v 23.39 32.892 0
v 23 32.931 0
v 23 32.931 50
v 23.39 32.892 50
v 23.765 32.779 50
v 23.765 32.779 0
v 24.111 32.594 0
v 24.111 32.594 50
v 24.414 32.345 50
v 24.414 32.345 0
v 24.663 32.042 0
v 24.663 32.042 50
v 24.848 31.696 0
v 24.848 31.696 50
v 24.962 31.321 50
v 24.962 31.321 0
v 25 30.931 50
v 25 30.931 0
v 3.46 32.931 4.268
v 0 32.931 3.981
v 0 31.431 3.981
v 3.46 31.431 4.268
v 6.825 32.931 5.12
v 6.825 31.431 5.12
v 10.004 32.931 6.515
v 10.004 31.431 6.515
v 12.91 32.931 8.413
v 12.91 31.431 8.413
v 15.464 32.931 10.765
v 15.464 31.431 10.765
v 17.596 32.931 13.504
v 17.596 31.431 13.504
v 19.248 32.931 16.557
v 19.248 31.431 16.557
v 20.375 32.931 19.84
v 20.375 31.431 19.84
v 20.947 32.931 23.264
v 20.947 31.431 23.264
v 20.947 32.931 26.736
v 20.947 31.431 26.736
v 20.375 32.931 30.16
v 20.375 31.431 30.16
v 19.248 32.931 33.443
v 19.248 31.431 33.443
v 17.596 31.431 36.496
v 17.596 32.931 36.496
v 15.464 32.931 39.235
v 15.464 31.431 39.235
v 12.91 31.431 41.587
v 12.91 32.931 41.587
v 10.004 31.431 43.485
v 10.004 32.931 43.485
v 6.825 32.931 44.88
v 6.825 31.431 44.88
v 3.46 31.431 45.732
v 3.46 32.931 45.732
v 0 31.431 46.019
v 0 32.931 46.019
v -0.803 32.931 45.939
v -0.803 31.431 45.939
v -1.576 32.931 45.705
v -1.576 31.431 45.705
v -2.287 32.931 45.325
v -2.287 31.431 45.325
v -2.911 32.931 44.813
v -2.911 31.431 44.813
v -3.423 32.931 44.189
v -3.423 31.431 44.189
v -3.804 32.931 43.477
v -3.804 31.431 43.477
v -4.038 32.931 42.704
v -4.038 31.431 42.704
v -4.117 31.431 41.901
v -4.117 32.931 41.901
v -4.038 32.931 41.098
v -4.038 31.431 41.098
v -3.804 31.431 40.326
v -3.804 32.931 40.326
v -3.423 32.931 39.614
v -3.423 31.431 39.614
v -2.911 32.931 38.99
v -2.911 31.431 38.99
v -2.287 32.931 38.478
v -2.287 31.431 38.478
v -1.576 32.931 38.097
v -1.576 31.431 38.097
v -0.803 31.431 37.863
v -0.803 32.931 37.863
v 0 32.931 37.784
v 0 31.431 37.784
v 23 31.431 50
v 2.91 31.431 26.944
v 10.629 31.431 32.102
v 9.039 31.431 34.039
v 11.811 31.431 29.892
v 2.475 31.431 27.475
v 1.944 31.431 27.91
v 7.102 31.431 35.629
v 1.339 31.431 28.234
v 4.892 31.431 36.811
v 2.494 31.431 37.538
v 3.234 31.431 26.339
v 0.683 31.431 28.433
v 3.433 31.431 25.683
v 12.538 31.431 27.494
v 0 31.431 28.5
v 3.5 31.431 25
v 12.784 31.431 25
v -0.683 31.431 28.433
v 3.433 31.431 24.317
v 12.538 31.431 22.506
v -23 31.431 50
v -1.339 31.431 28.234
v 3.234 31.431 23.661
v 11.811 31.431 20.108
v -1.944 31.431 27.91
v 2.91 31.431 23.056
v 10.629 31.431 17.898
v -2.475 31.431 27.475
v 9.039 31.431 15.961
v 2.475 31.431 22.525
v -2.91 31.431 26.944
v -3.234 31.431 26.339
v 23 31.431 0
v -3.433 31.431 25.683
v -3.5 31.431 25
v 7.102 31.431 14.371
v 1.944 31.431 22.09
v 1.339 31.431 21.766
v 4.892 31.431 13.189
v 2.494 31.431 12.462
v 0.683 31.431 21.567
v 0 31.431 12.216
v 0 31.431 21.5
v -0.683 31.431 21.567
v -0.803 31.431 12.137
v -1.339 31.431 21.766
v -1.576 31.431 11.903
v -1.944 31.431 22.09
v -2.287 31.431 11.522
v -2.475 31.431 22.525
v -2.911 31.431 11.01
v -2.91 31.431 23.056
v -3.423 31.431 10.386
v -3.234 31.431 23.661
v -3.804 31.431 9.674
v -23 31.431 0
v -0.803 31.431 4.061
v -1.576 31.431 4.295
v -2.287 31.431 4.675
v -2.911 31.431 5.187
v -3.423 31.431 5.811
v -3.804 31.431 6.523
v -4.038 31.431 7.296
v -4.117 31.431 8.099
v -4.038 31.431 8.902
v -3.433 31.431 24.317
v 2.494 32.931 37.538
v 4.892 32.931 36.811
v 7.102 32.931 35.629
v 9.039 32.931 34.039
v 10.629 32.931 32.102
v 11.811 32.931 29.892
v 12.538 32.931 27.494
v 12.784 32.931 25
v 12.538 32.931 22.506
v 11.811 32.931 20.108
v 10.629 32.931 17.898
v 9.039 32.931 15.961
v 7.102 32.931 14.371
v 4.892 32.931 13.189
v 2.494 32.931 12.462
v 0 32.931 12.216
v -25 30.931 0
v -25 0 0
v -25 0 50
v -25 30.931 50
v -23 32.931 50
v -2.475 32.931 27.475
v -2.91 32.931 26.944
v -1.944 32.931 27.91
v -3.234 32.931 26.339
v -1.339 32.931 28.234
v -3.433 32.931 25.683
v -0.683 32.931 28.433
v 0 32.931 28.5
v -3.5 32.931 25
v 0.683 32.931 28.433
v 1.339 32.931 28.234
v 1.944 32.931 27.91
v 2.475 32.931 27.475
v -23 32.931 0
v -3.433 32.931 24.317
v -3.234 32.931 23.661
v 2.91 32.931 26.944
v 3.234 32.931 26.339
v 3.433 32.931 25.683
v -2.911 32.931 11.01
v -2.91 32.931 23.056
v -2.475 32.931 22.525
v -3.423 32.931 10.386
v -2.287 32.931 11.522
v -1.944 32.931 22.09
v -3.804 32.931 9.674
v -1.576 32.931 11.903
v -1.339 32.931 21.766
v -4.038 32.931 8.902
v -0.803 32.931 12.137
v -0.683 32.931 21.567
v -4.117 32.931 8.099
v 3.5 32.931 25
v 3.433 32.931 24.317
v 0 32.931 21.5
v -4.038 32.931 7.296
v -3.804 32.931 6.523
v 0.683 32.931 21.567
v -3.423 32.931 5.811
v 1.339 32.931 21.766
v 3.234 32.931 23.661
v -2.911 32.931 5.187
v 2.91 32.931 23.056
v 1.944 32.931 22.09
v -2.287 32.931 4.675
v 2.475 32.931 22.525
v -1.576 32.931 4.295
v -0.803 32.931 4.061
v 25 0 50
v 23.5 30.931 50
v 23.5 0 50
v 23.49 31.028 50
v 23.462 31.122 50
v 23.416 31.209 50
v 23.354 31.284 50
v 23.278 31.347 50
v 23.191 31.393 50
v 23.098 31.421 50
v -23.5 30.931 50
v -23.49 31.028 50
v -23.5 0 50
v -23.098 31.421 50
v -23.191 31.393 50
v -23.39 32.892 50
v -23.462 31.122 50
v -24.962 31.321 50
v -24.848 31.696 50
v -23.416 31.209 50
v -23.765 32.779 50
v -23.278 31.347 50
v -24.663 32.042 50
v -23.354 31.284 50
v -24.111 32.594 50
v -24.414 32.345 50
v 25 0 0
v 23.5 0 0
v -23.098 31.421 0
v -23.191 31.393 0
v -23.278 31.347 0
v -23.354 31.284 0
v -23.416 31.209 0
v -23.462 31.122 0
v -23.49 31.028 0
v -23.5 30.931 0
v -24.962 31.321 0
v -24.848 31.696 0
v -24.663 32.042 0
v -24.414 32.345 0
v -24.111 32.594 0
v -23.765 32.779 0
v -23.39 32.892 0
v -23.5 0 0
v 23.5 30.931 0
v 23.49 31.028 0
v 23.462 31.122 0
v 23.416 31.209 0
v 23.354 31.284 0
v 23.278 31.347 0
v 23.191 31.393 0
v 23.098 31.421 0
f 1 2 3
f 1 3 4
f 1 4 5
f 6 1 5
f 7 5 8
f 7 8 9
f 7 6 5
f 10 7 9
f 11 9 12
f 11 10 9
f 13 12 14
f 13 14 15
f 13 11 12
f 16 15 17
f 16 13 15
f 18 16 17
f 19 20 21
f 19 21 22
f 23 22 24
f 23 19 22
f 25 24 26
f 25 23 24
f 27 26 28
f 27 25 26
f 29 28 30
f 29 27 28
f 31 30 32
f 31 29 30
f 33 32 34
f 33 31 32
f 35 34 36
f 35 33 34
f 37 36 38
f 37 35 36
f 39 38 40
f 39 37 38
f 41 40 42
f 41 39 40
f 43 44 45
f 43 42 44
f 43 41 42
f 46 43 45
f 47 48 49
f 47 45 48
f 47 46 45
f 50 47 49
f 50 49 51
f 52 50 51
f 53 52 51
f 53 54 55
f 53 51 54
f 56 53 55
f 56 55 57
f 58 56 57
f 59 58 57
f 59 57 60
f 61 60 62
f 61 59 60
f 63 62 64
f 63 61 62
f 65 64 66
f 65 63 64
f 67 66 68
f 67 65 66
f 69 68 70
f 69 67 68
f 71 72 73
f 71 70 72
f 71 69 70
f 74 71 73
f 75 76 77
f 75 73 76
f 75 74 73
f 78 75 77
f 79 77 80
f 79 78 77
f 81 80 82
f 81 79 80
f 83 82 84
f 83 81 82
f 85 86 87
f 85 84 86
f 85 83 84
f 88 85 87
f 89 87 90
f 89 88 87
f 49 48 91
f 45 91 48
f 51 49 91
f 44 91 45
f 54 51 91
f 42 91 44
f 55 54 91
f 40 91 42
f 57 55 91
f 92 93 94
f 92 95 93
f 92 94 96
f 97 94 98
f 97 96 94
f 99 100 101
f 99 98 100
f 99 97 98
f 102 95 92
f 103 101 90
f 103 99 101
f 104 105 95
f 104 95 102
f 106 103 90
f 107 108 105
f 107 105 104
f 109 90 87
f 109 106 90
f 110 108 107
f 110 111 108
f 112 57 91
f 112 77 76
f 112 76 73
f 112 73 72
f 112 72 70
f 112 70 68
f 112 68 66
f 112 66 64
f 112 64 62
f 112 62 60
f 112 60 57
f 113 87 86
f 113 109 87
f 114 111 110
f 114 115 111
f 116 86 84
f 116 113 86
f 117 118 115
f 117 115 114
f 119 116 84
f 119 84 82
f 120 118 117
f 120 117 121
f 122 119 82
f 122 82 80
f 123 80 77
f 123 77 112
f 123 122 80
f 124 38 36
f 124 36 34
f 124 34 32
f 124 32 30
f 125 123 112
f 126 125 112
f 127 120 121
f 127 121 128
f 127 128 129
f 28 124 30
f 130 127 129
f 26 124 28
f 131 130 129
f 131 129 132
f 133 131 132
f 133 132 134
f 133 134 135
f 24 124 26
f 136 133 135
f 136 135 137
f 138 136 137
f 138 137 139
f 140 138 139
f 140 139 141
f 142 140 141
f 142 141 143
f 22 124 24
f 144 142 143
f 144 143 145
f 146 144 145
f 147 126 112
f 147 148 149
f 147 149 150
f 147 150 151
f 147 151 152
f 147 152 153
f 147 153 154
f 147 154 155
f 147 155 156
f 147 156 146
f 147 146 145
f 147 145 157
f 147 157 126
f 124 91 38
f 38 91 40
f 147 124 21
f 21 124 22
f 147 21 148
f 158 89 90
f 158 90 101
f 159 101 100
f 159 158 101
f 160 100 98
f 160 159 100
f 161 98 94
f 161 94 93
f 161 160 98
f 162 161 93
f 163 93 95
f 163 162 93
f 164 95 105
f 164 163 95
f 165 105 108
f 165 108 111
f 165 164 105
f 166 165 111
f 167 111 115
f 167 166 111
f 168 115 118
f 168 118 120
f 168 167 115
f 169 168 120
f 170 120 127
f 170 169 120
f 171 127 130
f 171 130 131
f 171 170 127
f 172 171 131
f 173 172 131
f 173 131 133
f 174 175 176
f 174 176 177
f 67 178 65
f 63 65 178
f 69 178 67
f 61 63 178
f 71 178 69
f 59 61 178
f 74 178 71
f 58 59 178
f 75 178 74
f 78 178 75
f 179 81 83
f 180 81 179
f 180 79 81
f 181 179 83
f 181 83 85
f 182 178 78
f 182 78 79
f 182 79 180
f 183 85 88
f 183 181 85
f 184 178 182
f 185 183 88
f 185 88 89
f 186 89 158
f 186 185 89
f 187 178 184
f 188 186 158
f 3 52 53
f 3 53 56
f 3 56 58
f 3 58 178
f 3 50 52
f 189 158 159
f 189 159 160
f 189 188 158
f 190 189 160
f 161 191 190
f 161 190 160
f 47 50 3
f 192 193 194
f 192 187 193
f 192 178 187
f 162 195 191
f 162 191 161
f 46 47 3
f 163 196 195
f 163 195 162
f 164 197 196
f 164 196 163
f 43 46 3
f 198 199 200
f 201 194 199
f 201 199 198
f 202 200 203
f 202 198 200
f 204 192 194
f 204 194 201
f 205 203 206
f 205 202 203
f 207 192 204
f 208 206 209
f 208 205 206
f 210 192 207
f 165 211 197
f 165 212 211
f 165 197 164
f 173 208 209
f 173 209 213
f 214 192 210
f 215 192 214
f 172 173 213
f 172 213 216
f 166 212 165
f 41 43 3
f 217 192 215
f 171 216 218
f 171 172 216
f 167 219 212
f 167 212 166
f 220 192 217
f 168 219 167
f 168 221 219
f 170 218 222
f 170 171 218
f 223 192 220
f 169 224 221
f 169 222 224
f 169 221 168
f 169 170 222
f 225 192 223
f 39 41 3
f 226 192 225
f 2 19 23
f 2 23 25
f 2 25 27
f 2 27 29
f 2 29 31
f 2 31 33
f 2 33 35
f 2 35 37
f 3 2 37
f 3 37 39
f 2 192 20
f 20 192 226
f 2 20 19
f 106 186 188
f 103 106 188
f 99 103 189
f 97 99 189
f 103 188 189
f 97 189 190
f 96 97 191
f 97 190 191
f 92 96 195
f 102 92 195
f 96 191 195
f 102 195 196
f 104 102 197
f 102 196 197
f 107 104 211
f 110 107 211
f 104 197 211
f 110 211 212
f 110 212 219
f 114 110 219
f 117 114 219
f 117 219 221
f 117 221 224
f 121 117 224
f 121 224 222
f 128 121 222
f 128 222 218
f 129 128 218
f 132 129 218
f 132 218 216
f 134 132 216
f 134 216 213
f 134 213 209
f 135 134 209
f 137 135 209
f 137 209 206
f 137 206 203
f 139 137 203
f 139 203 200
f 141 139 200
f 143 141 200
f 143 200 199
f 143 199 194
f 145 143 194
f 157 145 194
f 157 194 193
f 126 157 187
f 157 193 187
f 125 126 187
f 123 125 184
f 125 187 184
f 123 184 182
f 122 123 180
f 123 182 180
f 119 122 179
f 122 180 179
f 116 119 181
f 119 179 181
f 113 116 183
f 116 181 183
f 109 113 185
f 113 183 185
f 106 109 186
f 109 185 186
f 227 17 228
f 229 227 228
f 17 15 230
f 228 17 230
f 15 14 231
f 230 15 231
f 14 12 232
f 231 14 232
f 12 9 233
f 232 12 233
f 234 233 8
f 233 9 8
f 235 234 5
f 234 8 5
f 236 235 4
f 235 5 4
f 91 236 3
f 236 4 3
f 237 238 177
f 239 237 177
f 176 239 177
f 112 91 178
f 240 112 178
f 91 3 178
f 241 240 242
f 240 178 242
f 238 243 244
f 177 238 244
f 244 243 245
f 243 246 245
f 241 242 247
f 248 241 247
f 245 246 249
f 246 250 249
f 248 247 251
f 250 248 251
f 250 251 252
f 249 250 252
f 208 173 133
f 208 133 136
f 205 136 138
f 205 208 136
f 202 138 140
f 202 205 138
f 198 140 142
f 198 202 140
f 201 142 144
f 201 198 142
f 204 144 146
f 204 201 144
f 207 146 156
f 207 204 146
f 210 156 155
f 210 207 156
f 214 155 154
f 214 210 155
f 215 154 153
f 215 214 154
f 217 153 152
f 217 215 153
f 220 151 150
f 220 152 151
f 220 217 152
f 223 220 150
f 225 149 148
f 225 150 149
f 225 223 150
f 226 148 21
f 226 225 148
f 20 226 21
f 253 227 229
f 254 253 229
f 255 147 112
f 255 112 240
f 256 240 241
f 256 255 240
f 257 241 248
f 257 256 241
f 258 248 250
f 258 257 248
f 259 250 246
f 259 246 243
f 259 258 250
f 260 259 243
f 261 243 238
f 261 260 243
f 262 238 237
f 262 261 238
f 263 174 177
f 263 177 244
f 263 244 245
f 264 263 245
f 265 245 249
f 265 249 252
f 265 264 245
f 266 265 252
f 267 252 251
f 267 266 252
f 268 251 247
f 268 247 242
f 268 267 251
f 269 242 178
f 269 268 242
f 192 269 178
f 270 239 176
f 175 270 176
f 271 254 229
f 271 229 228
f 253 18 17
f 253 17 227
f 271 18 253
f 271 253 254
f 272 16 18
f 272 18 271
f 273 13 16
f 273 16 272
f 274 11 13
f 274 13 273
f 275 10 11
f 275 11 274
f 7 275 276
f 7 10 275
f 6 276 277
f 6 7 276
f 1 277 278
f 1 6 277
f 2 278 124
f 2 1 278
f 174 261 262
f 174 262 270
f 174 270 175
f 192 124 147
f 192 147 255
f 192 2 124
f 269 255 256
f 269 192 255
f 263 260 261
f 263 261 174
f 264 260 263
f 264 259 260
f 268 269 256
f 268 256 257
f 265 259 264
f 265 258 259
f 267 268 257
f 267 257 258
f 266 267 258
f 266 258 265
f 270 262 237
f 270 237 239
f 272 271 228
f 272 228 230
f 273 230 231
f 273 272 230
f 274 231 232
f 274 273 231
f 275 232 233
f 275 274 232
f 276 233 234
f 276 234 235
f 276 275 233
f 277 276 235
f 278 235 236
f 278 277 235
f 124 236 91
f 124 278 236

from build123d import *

# Parameters (mm, degrees)
BASE_FLANGE1_DEPTH = 50
SKETCH2_R          = 3.5
CUT_EXTRUDE1_DEPTH = 10
CUT_EXTRUDE2_DEPTH = 3


# Sheet-metal steps are written as plain solids
with BuildPart() as part:
    # Sketch1 → Base-Flange1 (new body)
    with BuildSketch(Plane.XY):
        with BuildLine():
            Line((-25, 0), (-25, 30.930870366))
            ThreePointArc((-25, 30.930870366), (-24.414213562, 32.345083928), (-23, 32.930870366))
            Line((-23, 32.930870366), (23, 32.930870366))
            ThreePointArc((23, 32.930870366), (24.414213562, 32.345083928), (25, 30.930870366))
            Line((25, 30.930870366), (25, 0))
            Line((25, 0), (23.5, 0))
            Line((23.5, 0), (23.5, 30.930870366))
            ThreePointArc((23.5, 30.930870366), (23.353553391, 31.284423757), (23, 31.430870366))
            Line((23, 31.430870366), (-23, 31.430870366))
            ThreePointArc((-23, 31.430870366), (-23.353553391, 31.284423757), (-23.5, 30.930870366))
            Line((-23.5, 30.930870366), (-23.5, 0))
            Line((-23.5, 0), (-25, 0))
        make_face()
    extrude(amount=BASE_FLANGE1_DEPTH)

    # Sketch2 → Cut-Extrude1 (cut)
    with BuildSketch(Plane(origin=(0, 32.930870366, 0), x_dir=(1, 0, 0), z_dir=(0, 1, 0))):
        with Locations(Location((0, -25, 0), (0, 0, 270))):
            Circle(SKETCH2_R)
    extrude(amount=-CUT_EXTRUDE1_DEPTH, mode=Mode.SUBTRACT)

    # Sketch3 → Cut-Extrude2 (cut)
    with BuildSketch(Plane(origin=(0, 32.930870366, 0), x_dir=(1, 0, 0), z_dir=(0, 1, 0))):
        with BuildLine():
            ThreePointArc((0, -37.783779882), (12.783779882, -25), (0, -12.216220118))
            ThreePointArc((0, -12.216220118), (-4.117379141, -8.098840977), (0, -3.981461837))
            ThreePointArc((0, -3.981461837), (21.018538163, -25), (0, -46.018538163))
            ThreePointArc((0, -46.018538163), (-4.117379141, -41.901159023), (0, -37.783779882))
        make_face()
    extrude(amount=-CUT_EXTRUDE2_DEPTH, mode=Mode.SUBTRACT)


solid = part.part
